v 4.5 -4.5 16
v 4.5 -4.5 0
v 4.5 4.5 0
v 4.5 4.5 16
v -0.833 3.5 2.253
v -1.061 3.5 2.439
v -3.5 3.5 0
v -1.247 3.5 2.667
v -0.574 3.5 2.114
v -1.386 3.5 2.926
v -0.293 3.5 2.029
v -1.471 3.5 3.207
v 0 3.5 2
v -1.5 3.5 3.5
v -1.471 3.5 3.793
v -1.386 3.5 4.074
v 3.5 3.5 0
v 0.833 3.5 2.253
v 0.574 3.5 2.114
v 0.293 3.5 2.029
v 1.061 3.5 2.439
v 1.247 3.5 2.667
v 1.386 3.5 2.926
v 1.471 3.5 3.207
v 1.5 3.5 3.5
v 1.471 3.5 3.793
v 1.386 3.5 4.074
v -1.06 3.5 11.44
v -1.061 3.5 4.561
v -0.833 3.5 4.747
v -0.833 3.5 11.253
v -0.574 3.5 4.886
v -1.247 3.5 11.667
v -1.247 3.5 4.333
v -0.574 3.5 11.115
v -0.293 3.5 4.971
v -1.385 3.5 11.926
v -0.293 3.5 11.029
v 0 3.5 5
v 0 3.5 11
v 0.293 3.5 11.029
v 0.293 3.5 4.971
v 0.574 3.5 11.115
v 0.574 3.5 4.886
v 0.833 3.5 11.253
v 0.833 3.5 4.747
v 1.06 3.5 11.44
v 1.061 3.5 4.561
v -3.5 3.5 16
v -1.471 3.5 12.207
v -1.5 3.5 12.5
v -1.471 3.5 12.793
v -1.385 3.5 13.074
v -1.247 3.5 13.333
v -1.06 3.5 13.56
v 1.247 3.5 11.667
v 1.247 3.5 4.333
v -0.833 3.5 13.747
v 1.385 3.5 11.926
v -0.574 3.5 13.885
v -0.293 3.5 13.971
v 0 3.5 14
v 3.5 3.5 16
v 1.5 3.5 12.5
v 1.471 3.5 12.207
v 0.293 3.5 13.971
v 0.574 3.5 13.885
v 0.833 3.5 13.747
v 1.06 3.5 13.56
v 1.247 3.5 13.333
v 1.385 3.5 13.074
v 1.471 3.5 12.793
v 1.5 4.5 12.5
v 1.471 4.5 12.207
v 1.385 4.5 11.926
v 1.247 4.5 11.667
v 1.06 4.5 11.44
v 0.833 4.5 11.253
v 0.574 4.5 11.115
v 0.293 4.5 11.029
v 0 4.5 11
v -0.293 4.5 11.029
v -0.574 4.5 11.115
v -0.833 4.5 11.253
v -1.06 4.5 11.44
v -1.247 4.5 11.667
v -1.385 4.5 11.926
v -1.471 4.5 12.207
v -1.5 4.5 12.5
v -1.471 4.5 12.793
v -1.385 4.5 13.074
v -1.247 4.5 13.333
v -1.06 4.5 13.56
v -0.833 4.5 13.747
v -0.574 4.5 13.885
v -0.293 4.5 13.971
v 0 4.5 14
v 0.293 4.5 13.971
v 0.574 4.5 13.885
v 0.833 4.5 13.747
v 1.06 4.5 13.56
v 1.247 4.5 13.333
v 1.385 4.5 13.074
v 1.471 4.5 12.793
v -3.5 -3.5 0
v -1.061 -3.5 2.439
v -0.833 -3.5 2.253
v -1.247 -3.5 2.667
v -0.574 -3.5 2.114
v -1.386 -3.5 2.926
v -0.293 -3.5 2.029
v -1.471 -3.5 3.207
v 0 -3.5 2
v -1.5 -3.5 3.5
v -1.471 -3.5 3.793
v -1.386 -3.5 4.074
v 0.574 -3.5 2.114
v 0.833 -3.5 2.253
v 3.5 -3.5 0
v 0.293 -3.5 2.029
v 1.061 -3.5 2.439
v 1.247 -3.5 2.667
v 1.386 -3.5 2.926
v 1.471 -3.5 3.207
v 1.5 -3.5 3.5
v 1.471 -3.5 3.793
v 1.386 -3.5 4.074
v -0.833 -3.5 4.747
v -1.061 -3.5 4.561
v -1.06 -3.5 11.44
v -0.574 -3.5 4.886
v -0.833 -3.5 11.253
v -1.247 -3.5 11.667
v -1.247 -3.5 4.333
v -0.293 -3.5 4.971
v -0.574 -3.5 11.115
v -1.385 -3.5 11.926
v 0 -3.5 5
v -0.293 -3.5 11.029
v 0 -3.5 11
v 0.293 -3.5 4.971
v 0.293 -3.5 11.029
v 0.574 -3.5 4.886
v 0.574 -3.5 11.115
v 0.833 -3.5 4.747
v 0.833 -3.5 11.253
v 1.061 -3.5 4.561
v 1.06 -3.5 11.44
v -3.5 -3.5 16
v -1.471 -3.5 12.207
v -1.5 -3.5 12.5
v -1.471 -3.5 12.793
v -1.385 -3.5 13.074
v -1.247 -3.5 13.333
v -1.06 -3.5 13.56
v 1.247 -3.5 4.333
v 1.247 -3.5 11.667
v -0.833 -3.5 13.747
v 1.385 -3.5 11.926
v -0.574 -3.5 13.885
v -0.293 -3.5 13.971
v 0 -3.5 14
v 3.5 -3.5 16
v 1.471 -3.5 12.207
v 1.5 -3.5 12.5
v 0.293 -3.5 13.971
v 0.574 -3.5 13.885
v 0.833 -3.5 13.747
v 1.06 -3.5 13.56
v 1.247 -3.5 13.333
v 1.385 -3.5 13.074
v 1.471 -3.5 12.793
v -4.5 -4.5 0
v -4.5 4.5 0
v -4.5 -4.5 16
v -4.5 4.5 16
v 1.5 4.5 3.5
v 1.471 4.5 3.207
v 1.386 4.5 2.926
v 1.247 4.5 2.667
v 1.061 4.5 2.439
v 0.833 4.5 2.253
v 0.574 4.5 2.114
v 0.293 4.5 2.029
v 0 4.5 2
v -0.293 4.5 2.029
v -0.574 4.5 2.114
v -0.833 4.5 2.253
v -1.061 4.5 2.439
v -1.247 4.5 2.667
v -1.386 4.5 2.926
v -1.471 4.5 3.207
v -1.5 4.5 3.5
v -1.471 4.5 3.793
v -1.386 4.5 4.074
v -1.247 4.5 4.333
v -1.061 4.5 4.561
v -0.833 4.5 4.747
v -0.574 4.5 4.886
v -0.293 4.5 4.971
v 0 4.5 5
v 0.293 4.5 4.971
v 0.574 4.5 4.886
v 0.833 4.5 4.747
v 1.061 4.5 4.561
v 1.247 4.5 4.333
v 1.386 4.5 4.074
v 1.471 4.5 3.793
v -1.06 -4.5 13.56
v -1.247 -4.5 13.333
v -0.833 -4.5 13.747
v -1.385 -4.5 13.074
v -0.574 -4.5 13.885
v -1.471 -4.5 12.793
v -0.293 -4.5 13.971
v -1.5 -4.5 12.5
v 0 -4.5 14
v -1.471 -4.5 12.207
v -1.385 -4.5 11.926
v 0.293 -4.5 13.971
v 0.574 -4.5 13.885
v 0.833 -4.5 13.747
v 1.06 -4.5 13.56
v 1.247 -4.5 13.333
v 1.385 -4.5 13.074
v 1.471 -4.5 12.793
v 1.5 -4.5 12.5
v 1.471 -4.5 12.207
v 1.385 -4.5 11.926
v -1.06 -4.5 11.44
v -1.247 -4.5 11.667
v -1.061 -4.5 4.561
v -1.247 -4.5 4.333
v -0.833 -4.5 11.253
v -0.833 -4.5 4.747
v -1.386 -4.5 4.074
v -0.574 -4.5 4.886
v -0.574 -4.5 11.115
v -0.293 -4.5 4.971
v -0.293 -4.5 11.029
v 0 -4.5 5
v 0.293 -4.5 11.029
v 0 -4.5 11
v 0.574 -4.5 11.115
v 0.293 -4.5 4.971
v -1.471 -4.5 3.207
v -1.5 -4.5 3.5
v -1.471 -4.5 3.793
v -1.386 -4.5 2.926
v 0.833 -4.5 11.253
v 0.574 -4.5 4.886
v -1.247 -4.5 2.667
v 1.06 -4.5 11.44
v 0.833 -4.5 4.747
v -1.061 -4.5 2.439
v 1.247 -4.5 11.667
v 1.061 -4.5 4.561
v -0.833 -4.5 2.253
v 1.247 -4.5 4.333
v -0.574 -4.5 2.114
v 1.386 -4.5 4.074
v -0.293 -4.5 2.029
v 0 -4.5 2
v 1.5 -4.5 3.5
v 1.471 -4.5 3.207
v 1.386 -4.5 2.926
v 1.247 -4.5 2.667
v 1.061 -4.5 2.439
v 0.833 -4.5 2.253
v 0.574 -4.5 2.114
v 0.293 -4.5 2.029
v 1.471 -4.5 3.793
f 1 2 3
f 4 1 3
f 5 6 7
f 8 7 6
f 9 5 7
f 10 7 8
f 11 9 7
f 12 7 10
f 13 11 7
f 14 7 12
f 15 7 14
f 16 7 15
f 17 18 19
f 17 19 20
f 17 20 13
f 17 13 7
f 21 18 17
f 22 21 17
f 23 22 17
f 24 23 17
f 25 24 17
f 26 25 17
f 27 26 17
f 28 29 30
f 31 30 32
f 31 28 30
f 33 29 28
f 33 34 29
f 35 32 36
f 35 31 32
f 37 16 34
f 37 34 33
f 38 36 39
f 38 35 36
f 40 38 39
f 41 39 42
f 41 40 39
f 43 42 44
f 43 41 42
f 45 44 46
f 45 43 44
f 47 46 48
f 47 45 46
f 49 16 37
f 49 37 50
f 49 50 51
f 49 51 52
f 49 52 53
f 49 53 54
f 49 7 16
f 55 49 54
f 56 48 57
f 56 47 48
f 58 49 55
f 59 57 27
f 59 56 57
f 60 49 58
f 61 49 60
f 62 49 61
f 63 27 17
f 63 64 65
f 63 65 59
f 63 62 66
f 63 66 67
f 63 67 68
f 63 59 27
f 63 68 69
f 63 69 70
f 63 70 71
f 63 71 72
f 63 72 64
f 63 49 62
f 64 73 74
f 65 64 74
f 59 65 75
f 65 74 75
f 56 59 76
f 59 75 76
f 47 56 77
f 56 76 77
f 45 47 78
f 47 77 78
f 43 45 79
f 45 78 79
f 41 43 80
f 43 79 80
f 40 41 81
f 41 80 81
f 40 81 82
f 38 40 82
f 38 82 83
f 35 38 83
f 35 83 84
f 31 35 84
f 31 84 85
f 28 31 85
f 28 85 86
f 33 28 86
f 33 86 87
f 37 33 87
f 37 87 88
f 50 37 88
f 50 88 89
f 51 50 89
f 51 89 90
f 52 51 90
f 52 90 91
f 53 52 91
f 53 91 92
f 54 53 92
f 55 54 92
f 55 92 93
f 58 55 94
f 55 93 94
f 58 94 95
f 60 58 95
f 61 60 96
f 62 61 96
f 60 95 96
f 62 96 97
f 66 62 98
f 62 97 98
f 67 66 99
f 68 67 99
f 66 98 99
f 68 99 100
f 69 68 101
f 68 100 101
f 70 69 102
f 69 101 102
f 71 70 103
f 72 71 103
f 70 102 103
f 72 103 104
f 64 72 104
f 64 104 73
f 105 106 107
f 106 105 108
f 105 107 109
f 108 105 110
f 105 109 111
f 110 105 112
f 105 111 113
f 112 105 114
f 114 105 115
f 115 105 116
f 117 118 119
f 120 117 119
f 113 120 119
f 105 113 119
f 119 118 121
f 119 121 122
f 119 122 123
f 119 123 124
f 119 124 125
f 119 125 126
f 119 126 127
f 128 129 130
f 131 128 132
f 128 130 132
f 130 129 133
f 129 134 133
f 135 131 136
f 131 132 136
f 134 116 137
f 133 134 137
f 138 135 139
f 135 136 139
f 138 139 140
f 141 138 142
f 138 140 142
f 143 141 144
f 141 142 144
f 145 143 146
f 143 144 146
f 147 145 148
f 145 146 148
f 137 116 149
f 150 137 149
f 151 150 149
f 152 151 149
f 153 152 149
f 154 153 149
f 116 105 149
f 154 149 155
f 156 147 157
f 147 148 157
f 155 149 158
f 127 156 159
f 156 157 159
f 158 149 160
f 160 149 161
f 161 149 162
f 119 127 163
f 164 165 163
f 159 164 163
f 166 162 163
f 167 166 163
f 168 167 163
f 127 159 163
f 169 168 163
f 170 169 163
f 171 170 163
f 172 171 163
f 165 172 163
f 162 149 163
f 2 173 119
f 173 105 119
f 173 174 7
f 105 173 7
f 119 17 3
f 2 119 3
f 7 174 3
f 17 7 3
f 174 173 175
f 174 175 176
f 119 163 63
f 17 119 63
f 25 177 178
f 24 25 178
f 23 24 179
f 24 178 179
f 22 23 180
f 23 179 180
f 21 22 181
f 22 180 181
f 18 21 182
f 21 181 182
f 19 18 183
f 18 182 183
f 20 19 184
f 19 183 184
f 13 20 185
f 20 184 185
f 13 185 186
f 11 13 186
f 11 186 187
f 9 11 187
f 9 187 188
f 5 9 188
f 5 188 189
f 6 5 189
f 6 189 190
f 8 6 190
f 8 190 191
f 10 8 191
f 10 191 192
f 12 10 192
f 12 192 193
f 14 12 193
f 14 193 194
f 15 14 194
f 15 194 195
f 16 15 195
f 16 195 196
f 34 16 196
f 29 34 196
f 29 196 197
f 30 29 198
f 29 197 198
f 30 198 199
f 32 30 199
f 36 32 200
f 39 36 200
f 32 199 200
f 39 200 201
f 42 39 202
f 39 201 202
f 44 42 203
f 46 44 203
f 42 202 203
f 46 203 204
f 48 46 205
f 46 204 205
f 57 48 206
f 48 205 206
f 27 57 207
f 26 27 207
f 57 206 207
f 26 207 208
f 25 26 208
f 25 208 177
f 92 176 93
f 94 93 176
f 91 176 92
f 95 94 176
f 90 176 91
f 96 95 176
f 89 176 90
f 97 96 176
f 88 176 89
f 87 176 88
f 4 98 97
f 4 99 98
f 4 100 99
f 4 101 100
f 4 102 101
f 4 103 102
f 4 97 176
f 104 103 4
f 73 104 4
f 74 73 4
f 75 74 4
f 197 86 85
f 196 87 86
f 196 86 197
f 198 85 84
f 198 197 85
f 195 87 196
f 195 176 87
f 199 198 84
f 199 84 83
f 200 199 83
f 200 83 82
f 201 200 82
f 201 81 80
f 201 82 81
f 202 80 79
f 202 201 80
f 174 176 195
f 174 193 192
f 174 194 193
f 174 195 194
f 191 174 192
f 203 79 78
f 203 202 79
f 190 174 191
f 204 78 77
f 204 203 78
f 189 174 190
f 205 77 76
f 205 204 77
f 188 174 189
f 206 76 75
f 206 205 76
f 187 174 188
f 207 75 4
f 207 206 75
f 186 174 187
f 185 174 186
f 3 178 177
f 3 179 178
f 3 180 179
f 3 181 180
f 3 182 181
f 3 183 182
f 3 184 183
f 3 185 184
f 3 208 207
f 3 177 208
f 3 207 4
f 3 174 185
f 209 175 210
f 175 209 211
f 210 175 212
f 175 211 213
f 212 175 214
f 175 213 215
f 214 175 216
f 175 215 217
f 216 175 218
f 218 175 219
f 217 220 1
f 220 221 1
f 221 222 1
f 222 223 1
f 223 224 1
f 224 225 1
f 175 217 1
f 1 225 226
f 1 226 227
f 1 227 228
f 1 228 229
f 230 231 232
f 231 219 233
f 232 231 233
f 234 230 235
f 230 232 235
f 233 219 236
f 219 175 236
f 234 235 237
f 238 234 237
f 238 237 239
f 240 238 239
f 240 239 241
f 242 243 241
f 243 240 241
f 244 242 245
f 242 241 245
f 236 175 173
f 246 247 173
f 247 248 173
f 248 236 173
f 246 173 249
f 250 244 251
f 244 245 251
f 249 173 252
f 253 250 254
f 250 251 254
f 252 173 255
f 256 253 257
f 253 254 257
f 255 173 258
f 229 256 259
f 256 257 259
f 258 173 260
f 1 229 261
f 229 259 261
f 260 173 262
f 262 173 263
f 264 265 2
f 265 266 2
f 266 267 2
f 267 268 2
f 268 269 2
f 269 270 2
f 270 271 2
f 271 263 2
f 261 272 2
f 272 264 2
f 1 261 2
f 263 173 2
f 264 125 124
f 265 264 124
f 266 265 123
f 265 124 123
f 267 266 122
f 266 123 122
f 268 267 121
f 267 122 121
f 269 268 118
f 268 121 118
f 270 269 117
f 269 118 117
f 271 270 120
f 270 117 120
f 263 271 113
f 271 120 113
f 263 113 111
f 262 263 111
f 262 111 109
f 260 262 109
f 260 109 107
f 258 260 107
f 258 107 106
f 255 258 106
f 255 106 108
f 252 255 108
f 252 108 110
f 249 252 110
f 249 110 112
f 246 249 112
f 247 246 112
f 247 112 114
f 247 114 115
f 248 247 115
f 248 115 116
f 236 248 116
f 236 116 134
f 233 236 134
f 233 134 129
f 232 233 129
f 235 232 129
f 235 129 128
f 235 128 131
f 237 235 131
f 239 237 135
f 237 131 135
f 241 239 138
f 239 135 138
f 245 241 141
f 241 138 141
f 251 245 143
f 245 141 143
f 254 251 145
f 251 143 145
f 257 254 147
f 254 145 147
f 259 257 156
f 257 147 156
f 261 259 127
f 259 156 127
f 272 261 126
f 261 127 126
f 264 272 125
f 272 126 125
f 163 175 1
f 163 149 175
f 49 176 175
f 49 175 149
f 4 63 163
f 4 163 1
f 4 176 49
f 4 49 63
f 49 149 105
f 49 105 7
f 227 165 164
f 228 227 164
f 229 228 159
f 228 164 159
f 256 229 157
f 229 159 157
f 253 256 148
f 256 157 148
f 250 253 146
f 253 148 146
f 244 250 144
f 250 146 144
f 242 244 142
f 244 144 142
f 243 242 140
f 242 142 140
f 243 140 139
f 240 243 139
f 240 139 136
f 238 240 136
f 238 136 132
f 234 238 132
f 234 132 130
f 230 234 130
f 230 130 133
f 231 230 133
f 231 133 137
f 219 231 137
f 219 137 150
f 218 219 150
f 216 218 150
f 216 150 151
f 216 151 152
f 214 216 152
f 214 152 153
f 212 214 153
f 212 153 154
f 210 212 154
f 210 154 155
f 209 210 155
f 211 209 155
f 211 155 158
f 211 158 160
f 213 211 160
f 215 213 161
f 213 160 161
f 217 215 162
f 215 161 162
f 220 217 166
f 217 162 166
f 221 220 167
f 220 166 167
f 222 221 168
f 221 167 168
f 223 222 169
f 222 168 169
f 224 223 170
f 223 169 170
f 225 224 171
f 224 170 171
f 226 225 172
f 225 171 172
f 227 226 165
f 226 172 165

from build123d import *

# Parameters (mm, degrees)
SKETCH_1_W          = 9
SKETCH_1_H          = 9
EXTRUDE_1_DEPTH     = 16
SKETCH_2_W          = 7
SKETCH_2_H          = 7
CUT_EXTRUDE_1_DEPTH = 20
SKETCH_3_R          = 1.5
SKETCH_3_R_2        = 1.499605096
CUT_EXTRUDE_2_DEPTH = 20


with BuildPart() as part:
    # ｽｹｯﾁ1 → ﾎﾞｽ - 押し出し1 (new body)
    with BuildSketch(Plane.XY):
        Rectangle(SKETCH_1_W, SKETCH_1_H)
    extrude(amount=EXTRUDE_1_DEPTH)

    # ｽｹｯﾁ2 → ｶｯﾄ - 押し出し1 (cut)
    with BuildSketch(Plane.XY.offset(16)):
        Rectangle(SKETCH_2_W, SKETCH_2_H)
    extrude(amount=-CUT_EXTRUDE_1_DEPTH, mode=Mode.SUBTRACT)

    # ｽｹｯﾁ3 → ｶｯﾄ - 押し出し2 (cut)
    with BuildSketch(Plane(origin=(0, 4.5, 0), x_dir=(1, 0, 0), z_dir=(0, 1, 0))):
        with Locations((0, -3.5)):
            Circle(SKETCH_3_R)
        with Locations((0, -12.5)):
            Circle(SKETCH_3_R_2)
    extrude(amount=-CUT_EXTRUDE_2_DEPTH, mode=Mode.SUBTRACT)


solid = part.part
